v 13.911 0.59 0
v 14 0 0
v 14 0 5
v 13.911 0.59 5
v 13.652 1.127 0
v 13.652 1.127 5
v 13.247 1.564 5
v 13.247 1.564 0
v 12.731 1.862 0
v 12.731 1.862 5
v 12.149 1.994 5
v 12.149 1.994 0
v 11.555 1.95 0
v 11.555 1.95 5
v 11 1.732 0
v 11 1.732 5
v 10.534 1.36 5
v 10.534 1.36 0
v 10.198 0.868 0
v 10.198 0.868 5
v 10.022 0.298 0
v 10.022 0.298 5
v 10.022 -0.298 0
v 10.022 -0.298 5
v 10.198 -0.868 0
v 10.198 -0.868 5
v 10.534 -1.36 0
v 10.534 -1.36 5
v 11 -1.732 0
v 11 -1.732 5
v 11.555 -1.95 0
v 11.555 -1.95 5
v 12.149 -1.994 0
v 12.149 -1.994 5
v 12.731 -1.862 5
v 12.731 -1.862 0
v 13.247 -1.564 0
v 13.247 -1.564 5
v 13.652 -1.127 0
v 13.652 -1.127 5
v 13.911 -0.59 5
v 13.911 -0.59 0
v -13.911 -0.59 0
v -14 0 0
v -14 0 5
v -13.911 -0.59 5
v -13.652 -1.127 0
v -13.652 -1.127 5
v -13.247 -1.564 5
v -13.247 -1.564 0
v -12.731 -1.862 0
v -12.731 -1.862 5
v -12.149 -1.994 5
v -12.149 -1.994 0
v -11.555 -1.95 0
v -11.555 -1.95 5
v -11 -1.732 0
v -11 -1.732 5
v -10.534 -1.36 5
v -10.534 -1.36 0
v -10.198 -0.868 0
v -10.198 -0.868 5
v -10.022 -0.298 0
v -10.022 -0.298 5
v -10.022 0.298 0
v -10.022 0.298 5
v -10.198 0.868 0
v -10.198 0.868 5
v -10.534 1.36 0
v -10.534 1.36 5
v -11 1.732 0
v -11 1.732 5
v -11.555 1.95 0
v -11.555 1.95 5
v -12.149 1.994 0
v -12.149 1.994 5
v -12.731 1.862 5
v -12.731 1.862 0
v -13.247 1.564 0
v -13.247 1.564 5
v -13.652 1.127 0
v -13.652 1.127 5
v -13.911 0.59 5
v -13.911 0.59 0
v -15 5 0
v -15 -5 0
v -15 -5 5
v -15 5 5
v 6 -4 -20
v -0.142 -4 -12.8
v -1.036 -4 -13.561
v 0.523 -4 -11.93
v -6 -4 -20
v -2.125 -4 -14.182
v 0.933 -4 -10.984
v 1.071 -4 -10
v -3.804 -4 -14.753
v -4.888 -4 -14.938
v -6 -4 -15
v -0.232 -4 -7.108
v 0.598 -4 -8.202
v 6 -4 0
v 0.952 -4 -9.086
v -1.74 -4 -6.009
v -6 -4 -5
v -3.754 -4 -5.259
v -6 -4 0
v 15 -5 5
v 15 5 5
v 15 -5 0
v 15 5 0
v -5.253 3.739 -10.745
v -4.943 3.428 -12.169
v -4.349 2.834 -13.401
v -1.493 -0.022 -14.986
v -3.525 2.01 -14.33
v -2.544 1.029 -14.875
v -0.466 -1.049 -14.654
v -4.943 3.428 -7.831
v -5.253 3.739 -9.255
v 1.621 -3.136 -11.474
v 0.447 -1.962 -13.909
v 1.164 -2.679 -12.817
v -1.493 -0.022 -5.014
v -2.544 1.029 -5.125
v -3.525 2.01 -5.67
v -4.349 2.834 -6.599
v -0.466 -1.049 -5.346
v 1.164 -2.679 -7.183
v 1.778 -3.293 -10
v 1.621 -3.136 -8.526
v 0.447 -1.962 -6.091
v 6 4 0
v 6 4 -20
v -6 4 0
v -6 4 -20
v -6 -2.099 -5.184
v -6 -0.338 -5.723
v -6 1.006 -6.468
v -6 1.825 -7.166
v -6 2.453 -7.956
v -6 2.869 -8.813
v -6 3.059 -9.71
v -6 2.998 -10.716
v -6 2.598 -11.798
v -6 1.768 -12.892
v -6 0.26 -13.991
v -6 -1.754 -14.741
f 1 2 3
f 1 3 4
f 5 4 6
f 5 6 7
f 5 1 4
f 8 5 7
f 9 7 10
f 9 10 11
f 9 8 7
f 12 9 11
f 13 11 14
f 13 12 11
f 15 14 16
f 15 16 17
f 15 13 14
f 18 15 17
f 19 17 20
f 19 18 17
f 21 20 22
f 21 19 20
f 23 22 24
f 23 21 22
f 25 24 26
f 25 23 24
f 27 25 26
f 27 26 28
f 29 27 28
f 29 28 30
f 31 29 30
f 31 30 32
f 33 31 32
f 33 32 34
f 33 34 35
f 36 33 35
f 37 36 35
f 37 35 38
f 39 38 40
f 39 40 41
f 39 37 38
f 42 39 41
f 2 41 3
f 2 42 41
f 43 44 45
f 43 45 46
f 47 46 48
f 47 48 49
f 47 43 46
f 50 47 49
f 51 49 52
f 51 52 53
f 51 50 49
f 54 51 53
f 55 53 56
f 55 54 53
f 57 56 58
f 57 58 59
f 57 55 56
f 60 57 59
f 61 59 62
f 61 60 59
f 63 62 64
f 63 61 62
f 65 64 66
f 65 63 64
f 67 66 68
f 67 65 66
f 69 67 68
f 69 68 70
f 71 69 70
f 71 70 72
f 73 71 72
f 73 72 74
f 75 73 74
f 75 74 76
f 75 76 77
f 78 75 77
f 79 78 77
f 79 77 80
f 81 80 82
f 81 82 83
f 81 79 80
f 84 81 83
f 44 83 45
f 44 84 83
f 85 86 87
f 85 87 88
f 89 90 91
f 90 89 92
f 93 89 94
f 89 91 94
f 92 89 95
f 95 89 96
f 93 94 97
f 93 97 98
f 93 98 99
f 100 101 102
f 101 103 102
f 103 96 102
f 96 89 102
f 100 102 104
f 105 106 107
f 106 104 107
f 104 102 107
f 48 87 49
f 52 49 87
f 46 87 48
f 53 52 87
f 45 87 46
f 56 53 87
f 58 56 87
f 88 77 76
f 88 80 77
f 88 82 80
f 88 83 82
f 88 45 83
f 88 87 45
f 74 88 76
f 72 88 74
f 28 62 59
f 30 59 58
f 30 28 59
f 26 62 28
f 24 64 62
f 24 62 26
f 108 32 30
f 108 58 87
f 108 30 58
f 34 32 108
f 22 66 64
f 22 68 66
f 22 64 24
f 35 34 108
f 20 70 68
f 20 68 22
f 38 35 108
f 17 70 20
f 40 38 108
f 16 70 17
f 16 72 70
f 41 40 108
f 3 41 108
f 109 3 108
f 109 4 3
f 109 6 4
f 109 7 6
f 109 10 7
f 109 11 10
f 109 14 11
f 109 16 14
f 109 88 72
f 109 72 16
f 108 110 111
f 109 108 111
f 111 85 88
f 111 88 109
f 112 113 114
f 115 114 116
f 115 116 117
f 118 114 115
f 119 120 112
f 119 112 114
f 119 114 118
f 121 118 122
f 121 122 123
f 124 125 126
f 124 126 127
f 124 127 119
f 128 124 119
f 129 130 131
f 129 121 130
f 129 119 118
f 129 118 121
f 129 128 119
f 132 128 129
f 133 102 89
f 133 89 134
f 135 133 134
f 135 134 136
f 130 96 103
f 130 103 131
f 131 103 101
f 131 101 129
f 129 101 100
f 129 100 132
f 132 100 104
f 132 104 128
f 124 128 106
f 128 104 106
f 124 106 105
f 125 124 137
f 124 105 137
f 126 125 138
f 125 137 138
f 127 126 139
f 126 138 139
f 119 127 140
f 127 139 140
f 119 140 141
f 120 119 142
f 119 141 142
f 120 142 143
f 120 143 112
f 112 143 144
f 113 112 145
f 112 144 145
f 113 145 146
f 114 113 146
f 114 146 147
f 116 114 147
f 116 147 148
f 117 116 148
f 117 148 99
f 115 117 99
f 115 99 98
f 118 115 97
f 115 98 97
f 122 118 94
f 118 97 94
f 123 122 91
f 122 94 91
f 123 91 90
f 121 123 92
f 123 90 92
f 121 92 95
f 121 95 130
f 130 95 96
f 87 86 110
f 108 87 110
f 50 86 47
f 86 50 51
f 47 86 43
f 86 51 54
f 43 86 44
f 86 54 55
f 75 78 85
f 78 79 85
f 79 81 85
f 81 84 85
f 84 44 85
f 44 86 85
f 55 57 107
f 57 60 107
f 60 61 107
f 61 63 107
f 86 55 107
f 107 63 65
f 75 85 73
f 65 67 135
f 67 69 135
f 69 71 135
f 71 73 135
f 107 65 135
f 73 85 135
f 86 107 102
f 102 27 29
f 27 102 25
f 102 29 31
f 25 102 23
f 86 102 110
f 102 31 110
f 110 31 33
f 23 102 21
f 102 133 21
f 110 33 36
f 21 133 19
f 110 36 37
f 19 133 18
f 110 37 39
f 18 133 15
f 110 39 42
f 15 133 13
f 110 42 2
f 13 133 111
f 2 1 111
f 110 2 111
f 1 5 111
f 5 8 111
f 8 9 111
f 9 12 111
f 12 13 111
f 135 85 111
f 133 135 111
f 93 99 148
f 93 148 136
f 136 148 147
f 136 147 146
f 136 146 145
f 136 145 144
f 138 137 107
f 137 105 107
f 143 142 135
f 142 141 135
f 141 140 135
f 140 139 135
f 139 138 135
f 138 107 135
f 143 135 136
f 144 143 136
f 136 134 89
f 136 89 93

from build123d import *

# Parameters (mm, degrees)
SKETCH1_W           = 30
SKETCH1_H           = 10
SKETCH1_R           = 2
BOSS_EXTRUDE1_DEPTH = 5
SKETCH2_W           = 12
SKETCH2_H           = 8
BOSS_EXTRUDE2_DEPTH = 20
SKETCH3_R           = 5
CUT_EXTRUDE1_DEPTH  = 6


with BuildPart() as part:
    # Sketch1 → Boss-Extrude1 (new body)
    with BuildSketch(Plane.XY):
        Rectangle(SKETCH1_W, SKETCH1_H)
        with Locations((12, 0)):
            Circle(SKETCH1_R, mode=Mode.SUBTRACT)
        with Locations(Location((-12, 0, 0), (0, 0, 180))):
            Circle(SKETCH1_R, mode=Mode.SUBTRACT)
    extrude(amount=BOSS_EXTRUDE1_DEPTH)

    # Sketch2 → Boss-Extrude2 (add)
    with BuildSketch(Plane(origin=(0, 0, 0), x_dir=(-1, 0, 0), z_dir=(0, 0, -1))):
        Rectangle(SKETCH2_W, SKETCH2_H)
    extrude(amount=BOSS_EXTRUDE2_DEPTH)

    # Sketch3 → Cut-Extrude1 (cut)
    with BuildSketch(Plane(origin=(-5, -5, 0), x_dir=(-0.7071067811865477, 0.7071067811865475, 0), z_dir=(-0.7071067811865475, -0.7071067811865477, 0))):
        with Locations(Location((1.414213562, 10, 0), (0, 0, 180))):
            Circle(SKETCH3_R)
    extrude(amount=-CUT_EXTRUDE1_DEPTH, mode=Mode.SUBTRACT)


solid = part.part
